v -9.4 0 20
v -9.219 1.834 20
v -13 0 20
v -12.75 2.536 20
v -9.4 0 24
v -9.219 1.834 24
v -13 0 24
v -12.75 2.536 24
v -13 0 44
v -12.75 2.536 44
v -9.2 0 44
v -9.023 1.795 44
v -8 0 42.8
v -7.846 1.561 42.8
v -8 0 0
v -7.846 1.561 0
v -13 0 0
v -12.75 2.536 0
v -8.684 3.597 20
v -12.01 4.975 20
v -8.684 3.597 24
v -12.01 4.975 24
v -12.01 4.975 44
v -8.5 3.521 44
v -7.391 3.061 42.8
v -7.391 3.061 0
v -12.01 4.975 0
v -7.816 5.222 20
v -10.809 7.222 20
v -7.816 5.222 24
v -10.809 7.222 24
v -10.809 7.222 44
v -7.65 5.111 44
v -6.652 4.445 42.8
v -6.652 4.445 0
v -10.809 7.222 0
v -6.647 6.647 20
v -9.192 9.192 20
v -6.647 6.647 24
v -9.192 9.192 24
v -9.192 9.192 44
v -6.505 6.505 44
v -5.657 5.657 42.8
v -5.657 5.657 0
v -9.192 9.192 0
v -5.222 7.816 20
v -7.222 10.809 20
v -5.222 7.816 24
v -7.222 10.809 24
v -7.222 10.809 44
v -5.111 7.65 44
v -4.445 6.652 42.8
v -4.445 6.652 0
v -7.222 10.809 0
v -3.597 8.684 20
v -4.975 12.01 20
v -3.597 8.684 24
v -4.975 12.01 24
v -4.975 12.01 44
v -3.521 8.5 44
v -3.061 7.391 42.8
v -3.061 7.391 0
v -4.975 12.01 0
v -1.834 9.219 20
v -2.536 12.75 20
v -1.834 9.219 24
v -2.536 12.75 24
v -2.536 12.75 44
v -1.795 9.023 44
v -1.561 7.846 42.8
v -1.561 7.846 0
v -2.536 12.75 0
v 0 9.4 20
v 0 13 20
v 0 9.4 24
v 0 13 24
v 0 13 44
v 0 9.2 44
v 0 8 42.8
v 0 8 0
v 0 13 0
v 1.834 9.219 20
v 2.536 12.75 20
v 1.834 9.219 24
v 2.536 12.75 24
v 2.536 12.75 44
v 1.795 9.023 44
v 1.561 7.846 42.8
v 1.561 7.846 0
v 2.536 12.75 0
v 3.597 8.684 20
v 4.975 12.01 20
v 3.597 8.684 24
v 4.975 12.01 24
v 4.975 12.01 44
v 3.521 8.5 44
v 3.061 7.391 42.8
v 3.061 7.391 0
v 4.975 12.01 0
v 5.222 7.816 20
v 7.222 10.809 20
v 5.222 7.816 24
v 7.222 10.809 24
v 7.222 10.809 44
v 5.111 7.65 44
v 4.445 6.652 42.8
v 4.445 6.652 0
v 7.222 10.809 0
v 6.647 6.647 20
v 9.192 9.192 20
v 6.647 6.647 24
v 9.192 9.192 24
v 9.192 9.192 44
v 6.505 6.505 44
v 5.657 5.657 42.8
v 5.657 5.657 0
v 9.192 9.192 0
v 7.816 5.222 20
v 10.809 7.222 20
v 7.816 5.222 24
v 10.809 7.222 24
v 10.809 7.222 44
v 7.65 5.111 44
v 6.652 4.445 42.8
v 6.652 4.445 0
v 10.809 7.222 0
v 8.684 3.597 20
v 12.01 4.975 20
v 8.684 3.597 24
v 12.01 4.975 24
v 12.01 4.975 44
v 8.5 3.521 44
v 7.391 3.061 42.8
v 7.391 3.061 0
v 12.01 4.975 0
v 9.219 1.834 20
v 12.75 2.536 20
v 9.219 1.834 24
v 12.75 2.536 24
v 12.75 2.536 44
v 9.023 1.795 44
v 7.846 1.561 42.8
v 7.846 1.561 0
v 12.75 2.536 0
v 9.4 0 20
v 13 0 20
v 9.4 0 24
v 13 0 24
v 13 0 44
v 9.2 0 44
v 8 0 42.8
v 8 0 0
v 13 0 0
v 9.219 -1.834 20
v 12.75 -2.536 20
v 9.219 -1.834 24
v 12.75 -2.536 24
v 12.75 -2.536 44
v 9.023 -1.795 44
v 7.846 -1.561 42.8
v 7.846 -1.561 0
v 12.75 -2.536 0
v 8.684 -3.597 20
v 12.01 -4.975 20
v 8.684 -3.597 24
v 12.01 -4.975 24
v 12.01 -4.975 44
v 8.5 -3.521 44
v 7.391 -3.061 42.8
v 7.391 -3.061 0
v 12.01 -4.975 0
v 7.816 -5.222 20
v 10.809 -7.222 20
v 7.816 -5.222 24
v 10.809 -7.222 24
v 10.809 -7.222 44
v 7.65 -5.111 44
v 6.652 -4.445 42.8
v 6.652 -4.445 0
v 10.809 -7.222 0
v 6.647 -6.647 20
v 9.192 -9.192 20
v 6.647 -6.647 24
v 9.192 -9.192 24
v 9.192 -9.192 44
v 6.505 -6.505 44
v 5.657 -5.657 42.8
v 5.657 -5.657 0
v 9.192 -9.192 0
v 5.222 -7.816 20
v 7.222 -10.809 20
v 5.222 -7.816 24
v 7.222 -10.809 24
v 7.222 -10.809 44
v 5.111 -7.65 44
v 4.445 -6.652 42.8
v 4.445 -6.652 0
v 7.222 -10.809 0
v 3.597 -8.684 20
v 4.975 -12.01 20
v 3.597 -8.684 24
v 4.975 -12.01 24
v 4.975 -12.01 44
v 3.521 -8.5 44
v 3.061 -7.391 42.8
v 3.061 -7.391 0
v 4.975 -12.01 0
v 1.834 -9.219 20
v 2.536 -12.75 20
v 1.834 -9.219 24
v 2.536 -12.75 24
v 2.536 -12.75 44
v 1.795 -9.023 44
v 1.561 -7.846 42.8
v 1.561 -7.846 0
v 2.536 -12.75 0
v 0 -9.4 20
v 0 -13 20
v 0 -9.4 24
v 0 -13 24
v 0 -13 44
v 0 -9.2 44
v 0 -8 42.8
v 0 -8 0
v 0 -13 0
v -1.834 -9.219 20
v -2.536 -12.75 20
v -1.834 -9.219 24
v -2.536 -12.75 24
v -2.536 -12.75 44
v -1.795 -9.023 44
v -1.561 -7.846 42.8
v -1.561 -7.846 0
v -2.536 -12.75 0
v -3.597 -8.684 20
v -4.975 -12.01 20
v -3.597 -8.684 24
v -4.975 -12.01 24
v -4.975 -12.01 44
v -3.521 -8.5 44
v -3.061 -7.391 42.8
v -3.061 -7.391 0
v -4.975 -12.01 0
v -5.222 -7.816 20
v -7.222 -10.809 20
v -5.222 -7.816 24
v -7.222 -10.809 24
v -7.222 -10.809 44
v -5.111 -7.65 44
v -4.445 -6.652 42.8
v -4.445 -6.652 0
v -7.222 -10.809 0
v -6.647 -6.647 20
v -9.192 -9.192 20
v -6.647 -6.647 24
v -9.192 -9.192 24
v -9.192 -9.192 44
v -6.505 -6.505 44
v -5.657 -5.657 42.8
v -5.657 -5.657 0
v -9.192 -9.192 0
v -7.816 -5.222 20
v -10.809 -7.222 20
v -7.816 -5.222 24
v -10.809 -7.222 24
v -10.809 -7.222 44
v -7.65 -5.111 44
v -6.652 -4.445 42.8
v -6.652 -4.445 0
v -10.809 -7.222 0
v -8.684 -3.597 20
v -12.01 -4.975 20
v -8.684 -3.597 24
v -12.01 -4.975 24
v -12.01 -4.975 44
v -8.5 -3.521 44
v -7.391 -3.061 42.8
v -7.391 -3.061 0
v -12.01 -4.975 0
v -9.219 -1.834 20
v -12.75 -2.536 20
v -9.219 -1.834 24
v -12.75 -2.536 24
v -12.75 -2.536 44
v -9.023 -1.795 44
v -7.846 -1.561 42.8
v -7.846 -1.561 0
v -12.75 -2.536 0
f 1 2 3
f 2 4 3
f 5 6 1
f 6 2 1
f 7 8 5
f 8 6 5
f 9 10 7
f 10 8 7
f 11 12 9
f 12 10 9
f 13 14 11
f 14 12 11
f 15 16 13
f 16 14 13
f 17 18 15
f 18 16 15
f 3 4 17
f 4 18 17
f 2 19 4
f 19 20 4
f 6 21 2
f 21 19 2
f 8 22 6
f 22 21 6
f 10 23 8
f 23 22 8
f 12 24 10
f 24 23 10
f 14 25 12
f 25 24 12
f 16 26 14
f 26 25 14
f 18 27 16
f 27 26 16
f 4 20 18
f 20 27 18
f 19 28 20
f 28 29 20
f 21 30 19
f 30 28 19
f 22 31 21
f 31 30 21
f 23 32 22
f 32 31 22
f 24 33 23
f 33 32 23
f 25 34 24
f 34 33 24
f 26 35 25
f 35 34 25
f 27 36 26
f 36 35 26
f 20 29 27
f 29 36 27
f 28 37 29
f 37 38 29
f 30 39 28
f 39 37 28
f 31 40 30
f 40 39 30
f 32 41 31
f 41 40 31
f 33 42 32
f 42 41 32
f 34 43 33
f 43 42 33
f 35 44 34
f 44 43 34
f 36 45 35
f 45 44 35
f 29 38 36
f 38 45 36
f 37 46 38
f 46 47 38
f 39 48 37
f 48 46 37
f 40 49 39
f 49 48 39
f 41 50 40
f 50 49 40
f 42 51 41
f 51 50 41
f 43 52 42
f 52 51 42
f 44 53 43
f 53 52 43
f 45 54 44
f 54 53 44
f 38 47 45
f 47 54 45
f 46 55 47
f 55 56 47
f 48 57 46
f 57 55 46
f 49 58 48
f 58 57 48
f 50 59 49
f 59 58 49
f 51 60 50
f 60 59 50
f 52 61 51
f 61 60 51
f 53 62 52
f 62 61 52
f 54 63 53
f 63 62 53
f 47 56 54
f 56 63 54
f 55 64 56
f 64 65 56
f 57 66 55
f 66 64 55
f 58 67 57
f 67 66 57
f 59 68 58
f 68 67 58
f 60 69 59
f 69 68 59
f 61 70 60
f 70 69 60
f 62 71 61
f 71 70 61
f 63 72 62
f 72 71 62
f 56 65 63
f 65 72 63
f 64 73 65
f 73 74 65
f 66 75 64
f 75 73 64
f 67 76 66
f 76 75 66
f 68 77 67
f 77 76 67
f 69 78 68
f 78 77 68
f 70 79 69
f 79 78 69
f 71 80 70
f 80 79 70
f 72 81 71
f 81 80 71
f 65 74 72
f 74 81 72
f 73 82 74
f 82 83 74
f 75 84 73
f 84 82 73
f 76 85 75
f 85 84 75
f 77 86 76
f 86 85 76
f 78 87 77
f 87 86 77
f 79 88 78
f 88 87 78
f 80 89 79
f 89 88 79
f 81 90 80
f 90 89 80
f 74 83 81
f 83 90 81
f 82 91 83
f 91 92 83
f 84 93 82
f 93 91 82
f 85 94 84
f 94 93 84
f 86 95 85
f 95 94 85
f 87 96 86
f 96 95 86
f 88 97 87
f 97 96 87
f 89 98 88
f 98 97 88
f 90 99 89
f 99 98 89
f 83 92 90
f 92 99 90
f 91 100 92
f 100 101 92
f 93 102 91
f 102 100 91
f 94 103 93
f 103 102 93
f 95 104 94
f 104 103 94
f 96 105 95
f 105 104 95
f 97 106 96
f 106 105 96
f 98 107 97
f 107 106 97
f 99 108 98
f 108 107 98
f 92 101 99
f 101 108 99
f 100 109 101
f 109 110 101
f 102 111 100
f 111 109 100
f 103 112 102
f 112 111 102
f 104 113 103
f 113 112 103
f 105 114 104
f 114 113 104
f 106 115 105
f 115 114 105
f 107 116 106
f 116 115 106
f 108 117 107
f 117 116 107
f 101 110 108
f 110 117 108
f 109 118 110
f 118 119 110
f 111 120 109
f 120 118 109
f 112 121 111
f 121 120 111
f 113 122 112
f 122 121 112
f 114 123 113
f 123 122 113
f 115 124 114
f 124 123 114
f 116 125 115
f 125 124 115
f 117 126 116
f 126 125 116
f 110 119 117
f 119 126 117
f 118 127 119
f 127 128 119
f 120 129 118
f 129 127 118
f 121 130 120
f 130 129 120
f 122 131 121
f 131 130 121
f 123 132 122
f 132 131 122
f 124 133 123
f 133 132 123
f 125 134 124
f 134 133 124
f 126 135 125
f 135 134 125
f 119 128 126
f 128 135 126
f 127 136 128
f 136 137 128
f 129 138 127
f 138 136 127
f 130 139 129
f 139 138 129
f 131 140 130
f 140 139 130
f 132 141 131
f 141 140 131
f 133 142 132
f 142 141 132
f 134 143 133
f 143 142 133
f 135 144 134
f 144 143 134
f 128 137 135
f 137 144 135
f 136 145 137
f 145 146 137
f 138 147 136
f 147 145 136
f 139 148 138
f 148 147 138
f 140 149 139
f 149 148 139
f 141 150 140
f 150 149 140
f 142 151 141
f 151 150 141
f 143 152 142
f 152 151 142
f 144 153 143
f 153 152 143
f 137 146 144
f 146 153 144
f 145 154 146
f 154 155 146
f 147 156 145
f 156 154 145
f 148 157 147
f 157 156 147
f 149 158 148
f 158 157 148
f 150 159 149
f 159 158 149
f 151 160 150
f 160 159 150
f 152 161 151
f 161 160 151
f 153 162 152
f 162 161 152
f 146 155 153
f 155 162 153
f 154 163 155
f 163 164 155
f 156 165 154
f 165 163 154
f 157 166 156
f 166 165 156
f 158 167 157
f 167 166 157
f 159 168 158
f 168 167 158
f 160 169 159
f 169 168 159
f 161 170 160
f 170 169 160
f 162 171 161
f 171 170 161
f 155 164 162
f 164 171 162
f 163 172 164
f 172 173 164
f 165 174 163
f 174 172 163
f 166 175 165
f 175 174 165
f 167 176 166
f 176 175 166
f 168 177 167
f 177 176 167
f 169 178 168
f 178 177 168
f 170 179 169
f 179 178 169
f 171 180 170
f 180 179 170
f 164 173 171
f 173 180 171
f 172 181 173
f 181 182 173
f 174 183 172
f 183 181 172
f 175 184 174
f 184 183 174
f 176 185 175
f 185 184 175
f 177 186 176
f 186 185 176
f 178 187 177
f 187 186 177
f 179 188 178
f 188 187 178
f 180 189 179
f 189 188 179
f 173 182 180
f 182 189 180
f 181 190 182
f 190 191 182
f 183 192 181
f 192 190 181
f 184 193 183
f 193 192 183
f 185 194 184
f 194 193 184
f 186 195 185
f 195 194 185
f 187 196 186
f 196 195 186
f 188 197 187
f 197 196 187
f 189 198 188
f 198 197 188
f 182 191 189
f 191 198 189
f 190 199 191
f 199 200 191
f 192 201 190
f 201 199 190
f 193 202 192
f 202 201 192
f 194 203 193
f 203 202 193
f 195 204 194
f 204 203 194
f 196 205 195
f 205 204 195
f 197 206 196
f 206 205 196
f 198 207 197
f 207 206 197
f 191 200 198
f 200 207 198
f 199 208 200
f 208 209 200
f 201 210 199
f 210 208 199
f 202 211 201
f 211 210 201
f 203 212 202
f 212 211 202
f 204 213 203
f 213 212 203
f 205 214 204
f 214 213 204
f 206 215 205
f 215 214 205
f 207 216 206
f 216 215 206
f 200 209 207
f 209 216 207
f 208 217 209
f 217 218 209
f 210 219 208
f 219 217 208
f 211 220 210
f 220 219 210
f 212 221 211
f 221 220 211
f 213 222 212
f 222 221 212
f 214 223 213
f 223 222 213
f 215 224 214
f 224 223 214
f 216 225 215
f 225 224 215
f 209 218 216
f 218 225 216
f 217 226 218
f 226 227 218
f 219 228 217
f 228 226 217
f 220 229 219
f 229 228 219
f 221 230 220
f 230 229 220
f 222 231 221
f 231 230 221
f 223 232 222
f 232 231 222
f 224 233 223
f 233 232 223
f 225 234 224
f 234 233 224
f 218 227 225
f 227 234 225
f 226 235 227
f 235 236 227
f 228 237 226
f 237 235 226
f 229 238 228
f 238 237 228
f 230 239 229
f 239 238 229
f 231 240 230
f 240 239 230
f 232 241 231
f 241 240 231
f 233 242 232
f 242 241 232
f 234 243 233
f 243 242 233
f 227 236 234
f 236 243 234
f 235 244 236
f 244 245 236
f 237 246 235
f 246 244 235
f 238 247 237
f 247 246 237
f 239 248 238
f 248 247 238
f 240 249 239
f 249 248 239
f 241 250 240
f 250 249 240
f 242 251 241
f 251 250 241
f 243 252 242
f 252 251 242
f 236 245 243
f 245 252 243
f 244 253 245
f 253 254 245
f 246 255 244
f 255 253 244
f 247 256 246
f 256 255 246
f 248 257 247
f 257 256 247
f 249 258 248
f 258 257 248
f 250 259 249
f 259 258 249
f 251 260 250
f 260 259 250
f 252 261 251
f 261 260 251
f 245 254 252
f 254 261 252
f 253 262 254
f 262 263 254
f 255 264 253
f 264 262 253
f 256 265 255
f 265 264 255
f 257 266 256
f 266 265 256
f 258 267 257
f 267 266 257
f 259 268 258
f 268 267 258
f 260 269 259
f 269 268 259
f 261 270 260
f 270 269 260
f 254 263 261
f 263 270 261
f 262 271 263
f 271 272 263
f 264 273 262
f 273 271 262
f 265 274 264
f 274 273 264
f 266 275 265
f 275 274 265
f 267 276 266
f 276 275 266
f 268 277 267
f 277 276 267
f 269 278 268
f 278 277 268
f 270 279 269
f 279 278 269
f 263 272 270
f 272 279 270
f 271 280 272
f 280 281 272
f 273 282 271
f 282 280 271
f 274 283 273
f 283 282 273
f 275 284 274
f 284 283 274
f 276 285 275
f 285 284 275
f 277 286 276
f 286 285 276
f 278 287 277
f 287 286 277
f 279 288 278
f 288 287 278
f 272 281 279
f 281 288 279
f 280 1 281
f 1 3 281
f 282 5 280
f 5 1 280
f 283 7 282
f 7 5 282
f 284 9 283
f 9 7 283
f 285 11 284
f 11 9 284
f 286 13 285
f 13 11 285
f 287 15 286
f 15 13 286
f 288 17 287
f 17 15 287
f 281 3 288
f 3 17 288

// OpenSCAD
$fn = 32;

// ----------------------------------------------------------------------
// Grooved revolve: thread_relief, bore R8
// ----------------------------------------------------------------------

// --- parameters (mm) ---
bore_r = 8;               // bore radius
outer_r = 13;             // outer radius of the body
total_h = 44;             // overall height, Z
wall = 5;                 // radial wall thickness
groove_w = 4;             // groove width
groove_d = 3.6;           // groove depth
grooves = 1;              // number of outer grooves
relief = 1.2;             // thread relief leg at the bore mouth
relief_angle = 45;        // thread relief chamfer angle, degrees

bbox_x = 2 * outer_r;  // full diameter
bore_d = 2 * bore_r;  // bore diameter
body_d = 2 * outer_r;  // body diameter
revolve_angle = 360;  // full turn around the Z axis

profile = [[8, 0], [13, 0], [13, 20], [9.4, 20], [9.4, 24], [13, 24], [13, 44], [9.2, 44], [8, 42.8]];  // primary outline, 9 points, counter clockwise

// --- the one profile operation ---
rotate_extrude(angle = revolve_angle) polygon(points = profile);
